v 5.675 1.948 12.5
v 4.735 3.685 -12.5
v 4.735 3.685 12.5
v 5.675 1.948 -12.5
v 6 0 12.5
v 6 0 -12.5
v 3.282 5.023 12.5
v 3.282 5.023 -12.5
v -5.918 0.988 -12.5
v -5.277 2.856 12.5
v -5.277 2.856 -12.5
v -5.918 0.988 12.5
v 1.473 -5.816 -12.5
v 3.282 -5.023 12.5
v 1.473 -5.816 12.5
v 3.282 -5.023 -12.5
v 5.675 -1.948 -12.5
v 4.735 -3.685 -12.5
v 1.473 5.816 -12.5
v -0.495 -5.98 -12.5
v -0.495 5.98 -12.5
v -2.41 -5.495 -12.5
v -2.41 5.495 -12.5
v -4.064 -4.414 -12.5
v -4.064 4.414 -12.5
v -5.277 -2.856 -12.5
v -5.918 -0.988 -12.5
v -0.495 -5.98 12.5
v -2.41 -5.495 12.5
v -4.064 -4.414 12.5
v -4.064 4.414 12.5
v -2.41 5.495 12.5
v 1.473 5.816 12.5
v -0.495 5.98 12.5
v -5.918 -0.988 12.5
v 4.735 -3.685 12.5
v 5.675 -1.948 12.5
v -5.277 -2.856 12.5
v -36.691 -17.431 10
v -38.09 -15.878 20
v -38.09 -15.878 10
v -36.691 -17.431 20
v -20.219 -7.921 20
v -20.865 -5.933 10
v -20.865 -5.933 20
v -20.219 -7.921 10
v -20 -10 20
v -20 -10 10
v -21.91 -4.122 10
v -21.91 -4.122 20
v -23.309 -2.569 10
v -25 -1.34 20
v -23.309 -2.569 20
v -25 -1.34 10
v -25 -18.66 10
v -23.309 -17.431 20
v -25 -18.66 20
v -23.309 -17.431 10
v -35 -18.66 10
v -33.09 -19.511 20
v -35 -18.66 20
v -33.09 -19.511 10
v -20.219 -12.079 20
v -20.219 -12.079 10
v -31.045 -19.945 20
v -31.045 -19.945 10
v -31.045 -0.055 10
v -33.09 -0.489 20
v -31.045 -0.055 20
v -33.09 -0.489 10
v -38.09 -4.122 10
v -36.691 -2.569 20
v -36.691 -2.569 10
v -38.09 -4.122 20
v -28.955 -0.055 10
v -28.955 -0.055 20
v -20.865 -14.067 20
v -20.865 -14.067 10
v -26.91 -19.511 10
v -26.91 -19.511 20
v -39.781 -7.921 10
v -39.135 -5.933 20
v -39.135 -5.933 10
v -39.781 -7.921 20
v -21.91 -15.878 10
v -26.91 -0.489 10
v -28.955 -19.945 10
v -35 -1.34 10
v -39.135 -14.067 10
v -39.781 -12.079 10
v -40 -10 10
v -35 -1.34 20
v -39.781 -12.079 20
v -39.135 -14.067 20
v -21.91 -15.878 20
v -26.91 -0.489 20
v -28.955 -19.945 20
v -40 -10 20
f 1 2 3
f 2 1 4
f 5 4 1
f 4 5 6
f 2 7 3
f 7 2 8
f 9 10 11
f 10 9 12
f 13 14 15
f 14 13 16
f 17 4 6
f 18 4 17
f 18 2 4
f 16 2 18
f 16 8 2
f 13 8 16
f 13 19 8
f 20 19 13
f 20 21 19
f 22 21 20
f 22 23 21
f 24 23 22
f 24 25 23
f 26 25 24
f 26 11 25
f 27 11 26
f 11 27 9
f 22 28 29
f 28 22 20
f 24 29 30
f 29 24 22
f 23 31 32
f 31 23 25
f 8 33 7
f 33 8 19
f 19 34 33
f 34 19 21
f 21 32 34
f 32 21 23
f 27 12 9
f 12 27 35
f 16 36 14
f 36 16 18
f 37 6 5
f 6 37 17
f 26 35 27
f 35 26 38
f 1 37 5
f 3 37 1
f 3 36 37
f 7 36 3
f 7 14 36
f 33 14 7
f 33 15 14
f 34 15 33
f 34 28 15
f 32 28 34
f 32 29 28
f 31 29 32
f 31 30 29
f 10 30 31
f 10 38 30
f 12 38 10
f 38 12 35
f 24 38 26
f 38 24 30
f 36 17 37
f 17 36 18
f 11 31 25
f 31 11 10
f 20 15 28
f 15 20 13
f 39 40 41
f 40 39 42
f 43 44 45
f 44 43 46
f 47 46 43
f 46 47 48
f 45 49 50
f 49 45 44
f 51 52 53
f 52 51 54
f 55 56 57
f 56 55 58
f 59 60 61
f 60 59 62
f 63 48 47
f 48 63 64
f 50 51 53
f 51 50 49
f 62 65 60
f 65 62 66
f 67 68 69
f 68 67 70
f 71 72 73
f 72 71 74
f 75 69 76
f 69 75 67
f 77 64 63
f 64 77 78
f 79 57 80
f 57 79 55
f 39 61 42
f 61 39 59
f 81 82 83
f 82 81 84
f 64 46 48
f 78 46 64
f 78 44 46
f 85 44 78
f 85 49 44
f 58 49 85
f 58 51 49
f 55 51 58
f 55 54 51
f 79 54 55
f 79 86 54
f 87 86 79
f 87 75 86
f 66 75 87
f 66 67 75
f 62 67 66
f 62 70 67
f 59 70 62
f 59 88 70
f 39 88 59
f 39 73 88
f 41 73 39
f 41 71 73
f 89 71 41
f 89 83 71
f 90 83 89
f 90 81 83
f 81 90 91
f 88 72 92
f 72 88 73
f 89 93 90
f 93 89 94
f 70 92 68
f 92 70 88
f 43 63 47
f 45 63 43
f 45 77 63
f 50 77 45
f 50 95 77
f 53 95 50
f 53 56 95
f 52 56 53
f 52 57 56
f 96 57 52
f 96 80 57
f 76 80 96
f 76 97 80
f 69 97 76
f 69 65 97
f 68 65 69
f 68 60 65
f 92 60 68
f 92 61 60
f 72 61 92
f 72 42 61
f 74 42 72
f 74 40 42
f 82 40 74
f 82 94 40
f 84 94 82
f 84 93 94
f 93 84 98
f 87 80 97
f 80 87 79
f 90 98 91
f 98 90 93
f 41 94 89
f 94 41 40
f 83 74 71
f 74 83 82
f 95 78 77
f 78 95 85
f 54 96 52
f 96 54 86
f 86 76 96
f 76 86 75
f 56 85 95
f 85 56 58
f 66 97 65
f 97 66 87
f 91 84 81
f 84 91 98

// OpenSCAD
// Generated by generate_scads.py
union() {
  cylinder(h=25, r=6, center=true);
  translate([-30,-10,10]) {
    cylinder(h=10, r=10, center=false);
  }
}
